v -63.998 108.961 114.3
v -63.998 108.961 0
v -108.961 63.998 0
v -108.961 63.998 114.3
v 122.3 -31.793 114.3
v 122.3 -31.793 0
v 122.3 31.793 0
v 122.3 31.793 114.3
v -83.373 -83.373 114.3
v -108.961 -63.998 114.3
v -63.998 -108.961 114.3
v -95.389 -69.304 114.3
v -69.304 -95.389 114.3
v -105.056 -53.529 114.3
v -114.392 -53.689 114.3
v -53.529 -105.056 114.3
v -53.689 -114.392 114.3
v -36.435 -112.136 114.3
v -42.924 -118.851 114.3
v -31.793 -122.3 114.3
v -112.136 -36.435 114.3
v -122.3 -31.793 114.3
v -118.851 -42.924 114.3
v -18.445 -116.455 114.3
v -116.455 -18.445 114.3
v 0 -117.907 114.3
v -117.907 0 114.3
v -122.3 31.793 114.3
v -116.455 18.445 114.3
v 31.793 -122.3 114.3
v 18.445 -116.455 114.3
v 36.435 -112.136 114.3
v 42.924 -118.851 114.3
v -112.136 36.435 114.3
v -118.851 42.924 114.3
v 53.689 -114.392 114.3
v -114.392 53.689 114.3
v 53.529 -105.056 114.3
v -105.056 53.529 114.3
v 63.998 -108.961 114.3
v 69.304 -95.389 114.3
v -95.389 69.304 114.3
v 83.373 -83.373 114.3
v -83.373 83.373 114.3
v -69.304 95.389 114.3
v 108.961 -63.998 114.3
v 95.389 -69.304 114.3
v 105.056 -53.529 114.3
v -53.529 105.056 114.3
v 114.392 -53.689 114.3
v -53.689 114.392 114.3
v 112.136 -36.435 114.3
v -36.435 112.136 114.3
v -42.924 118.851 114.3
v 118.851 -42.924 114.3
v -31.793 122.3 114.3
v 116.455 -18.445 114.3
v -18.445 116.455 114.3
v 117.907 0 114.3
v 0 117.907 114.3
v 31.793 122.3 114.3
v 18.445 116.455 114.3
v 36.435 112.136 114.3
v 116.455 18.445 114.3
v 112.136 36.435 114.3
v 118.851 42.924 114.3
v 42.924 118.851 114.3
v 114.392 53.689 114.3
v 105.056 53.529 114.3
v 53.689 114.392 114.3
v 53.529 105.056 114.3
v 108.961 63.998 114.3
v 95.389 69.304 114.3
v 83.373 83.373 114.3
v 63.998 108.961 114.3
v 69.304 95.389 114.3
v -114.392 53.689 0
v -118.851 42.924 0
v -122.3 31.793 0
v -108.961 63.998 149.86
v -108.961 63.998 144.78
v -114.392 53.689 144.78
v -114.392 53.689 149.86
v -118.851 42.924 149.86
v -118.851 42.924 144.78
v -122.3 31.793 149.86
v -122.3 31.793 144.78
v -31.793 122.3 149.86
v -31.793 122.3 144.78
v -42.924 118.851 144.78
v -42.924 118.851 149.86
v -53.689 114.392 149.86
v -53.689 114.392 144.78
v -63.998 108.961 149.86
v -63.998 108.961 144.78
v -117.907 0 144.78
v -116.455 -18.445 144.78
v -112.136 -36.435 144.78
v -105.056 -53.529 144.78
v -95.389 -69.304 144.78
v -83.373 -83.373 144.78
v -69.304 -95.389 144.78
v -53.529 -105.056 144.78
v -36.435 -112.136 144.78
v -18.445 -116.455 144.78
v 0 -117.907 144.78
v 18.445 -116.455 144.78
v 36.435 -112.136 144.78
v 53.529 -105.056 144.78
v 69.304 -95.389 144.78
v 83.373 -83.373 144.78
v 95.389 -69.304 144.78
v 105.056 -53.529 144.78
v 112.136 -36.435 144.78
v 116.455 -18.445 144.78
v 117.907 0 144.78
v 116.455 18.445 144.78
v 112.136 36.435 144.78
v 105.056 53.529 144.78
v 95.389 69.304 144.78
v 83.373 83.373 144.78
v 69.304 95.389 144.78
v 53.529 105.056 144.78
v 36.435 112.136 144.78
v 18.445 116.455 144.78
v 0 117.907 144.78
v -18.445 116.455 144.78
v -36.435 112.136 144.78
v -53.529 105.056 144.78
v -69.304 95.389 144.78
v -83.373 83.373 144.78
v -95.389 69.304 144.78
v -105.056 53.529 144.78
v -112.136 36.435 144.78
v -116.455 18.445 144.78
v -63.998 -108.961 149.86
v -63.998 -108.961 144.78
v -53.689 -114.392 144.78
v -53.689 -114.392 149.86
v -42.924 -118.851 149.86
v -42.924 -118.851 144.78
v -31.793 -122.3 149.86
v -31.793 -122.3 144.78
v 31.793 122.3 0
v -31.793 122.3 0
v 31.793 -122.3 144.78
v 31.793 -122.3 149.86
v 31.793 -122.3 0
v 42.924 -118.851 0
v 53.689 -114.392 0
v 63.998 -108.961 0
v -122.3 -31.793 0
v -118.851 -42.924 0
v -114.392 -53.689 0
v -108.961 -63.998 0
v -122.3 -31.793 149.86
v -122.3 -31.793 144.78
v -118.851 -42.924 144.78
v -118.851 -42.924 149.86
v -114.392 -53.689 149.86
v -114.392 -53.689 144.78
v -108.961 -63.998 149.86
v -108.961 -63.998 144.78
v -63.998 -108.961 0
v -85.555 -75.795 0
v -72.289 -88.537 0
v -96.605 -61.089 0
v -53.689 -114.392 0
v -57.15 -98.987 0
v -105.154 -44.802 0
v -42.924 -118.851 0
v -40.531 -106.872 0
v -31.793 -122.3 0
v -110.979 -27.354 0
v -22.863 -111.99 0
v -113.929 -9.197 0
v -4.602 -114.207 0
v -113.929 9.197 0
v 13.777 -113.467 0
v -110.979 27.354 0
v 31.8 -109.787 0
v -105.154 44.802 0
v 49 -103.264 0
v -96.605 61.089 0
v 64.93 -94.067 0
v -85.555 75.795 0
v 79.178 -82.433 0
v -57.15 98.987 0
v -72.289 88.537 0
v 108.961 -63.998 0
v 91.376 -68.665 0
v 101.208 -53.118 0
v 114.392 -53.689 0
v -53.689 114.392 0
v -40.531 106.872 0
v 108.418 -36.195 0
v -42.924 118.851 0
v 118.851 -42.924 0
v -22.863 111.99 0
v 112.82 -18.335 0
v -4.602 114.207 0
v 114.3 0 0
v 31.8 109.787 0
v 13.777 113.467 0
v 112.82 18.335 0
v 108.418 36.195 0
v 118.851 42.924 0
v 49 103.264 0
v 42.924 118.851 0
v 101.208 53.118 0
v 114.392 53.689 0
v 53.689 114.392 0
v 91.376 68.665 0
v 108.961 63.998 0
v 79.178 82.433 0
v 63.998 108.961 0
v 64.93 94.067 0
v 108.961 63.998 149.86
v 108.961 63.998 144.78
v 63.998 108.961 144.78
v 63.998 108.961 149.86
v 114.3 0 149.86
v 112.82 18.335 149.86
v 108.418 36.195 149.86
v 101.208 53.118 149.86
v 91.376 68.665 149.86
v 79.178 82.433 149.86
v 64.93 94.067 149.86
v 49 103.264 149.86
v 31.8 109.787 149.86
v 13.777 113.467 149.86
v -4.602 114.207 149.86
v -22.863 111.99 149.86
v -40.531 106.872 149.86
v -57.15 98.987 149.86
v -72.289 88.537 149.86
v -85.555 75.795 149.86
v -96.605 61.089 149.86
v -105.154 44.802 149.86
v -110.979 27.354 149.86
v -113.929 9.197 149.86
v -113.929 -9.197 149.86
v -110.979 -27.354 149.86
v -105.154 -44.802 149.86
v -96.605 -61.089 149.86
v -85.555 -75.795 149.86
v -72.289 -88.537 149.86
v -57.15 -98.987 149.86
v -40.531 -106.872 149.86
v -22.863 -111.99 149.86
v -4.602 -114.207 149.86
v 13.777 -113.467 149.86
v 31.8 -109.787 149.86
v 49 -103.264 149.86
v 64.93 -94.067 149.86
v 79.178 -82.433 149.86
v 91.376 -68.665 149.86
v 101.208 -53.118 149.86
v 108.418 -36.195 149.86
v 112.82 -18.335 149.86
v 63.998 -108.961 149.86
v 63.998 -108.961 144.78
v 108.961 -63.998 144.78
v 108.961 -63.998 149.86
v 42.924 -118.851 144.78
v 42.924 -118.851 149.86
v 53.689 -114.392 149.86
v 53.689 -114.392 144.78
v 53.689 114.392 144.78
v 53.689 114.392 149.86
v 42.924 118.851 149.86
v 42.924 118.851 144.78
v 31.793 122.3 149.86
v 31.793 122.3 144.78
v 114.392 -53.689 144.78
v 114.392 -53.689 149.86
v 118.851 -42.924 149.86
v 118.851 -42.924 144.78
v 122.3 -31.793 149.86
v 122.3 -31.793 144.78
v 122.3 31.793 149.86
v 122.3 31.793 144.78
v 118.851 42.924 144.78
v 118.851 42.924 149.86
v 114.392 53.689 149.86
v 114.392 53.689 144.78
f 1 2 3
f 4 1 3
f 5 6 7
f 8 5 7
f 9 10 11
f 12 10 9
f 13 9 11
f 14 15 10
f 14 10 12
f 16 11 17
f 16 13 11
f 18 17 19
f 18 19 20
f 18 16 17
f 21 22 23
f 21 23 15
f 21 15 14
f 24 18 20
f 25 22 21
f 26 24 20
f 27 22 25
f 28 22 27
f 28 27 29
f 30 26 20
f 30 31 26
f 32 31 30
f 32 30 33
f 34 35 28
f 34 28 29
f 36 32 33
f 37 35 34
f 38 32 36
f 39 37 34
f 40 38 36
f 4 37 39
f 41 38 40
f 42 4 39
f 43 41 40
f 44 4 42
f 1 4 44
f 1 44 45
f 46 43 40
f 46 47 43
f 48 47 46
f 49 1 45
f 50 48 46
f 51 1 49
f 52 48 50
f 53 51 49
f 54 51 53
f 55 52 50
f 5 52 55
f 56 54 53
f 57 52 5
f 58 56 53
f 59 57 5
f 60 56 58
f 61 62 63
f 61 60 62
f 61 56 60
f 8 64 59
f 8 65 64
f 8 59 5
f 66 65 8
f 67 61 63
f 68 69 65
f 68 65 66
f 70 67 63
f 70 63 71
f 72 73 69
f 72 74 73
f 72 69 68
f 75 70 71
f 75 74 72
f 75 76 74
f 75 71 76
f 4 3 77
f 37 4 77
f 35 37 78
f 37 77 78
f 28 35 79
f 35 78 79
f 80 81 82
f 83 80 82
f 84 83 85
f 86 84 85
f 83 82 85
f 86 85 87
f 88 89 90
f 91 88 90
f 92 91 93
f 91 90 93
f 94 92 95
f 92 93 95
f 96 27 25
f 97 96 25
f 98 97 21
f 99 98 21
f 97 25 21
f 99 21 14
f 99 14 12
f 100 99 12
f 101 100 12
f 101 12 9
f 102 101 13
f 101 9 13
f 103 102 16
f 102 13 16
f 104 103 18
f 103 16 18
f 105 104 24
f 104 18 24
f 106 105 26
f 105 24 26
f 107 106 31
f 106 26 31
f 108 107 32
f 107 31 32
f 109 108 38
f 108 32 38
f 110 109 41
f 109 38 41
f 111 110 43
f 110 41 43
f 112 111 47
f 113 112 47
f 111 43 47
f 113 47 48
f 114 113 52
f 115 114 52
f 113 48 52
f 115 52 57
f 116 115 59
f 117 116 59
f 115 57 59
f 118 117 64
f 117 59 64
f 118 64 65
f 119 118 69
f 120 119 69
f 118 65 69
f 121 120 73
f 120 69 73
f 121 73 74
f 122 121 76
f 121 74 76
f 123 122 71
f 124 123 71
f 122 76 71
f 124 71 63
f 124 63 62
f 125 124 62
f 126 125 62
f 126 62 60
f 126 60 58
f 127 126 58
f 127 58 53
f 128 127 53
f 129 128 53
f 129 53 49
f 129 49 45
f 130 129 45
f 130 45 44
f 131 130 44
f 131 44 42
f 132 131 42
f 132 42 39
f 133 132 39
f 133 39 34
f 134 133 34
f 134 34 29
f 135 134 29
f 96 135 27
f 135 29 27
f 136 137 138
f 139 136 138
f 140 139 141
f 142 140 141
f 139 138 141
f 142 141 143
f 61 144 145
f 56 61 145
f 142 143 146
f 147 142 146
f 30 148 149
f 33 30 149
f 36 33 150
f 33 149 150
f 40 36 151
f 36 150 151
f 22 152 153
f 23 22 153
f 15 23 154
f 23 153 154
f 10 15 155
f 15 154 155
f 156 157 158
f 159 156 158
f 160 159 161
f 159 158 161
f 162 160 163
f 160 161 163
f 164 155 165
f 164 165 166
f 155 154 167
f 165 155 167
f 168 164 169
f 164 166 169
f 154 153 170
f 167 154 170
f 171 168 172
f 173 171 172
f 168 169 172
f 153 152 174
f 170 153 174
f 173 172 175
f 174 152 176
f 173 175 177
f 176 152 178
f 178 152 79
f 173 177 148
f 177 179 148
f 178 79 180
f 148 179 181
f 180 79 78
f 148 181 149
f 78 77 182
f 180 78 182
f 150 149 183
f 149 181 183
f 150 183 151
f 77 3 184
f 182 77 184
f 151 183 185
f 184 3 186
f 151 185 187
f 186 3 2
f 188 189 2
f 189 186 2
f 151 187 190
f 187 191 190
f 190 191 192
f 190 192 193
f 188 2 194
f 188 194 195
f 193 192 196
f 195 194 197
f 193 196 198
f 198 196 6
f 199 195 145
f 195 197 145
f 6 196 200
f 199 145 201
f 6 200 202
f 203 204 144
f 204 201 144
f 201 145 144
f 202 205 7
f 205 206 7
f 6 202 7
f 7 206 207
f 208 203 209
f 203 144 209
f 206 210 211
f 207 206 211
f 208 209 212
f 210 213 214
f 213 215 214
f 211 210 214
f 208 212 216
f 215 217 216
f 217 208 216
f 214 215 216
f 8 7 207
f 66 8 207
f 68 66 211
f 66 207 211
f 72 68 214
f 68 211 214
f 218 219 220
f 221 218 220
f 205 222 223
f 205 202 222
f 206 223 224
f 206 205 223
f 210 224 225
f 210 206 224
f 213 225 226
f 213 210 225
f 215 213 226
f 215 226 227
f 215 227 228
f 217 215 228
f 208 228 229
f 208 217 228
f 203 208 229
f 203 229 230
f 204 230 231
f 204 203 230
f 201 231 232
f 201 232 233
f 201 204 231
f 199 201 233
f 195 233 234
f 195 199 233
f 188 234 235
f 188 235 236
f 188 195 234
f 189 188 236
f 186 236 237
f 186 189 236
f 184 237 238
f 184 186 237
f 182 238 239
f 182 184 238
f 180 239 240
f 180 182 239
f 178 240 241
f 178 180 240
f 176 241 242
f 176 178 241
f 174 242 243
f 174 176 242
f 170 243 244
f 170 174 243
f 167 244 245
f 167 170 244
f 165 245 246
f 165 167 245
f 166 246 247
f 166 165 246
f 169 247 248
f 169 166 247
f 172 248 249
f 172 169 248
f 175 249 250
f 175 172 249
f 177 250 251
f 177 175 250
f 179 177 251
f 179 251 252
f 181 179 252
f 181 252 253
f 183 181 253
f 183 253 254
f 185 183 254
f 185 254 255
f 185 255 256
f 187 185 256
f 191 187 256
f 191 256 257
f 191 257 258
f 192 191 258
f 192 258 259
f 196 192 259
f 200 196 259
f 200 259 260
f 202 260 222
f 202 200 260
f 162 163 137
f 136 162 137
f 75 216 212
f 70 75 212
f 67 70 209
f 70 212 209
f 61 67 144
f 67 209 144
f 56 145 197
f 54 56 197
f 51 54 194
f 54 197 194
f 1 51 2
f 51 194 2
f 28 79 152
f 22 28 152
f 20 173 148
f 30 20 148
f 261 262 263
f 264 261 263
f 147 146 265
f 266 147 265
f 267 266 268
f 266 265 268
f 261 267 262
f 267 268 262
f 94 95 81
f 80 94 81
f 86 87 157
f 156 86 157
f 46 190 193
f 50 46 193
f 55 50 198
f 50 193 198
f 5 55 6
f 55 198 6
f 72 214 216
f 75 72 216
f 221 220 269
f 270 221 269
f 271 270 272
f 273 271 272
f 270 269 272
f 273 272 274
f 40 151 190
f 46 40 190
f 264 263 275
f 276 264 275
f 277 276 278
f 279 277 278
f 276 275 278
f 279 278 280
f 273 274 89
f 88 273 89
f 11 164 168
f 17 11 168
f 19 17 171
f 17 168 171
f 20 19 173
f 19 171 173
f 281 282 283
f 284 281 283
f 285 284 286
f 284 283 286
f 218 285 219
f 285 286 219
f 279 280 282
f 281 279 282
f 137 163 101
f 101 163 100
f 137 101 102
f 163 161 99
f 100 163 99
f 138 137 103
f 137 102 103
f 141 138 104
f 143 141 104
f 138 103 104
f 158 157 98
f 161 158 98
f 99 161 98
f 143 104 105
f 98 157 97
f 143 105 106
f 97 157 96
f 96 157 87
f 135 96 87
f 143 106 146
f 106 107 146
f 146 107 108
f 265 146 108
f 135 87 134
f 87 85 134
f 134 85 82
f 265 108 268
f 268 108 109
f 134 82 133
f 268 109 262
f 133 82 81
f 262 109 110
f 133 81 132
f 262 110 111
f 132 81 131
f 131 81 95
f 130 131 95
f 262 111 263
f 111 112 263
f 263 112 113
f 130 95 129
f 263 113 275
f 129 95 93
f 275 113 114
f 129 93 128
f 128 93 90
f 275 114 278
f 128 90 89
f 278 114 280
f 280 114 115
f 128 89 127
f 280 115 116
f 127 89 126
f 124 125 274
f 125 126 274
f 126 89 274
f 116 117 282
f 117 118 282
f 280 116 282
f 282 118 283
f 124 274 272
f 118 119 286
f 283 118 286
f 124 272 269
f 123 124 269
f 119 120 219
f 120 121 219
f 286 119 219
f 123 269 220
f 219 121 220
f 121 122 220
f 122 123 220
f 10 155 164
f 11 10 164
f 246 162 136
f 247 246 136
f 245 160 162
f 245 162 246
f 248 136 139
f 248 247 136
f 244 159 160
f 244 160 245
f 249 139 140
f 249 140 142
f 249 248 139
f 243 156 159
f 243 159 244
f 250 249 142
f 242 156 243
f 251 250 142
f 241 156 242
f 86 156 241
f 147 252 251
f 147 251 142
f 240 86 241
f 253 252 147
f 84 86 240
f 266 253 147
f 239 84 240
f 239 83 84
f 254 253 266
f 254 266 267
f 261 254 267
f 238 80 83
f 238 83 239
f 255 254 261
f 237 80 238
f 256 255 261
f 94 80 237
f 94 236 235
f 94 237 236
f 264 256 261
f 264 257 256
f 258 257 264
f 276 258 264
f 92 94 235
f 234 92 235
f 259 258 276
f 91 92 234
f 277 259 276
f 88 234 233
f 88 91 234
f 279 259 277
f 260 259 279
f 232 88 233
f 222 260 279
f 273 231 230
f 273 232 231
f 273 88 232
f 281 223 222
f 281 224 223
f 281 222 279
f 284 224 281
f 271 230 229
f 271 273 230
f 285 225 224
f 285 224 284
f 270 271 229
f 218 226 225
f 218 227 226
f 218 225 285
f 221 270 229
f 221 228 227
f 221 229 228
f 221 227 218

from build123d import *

# Parameters (mm, degrees)
SKETCH1_R           = 114.3
BOSS_EXTRUDE1_DEPTH = 114.3
SKETCH2_R           = 117.9068
SKETCH2_R_2         = 114.3
BOSS_EXTRUDE2_DEPTH = 30.48
SKETCH3_R           = 114.3
BOSS_EXTRUDE3_DEPTH = 5.08


with BuildPart() as part:
    # Sketch1 → Boss-Extrude1 (new body)
    with BuildSketch(Plane.XY):
        with BuildLine():
            ThreePointArc((-31.793446259, 122.3), (-48.357791931, 116.746037126), (-63.997797892, 108.960520786))
            Line((-63.997797892, 108.960520786), (-108.960520786, 63.997797892))
            ThreePointArc((-108.960520786, 63.997797892), (-116.746037126, 48.357791931), (-122.3, 31.793446259))
            Line((-122.3, 31.793446259), (-122.3, -31.793446259))
            ThreePointArc((-122.3, -31.793446259), (-116.746037126, -48.357791931), (-108.960520786, -63.997797892))
            Line((-108.960520786, -63.997797892), (-63.997797892, -108.960520786))
            ThreePointArc((-63.997797892, -108.960520786), (-48.357791931, -116.746037126), (-31.793446259, -122.3))
            Line((-31.793446259, -122.3), (31.793446259, -122.3))
            ThreePointArc((31.793446259, -122.3), (48.357791931, -116.746037126), (63.997797892, -108.960520786))
            Line((63.997797892, -108.960520786), (108.960520786, -63.997797892))
            ThreePointArc((108.960520786, -63.997797892), (116.746037126, -48.357791931), (122.3, -31.793446259))
            Line((122.3, -31.793446259), (122.3, 31.793446259))
            ThreePointArc((122.3, 31.793446259), (116.746037126, 48.357791931), (108.960520786, 63.997797892))
            Line((108.960520786, 63.997797892), (63.997797892, 108.960520786))
            ThreePointArc((63.997797892, 108.960520786), (48.357791931, 116.746037126), (31.793446259, 122.3))
            Line((31.793446259, 122.3), (-31.793446259, 122.3))
        make_face()
        Circle(SKETCH1_R, mode=Mode.SUBTRACT)
    extrude(amount=BOSS_EXTRUDE1_DEPTH)

    # Sketch2 → Boss-Extrude2 (add)
    with BuildSketch(Plane.XY.offset(114.3)):
        with Locations(Location((0, 0, 0), (0, 0, 180))):
            Circle(SKETCH2_R)
        Circle(SKETCH2_R_2, mode=Mode.SUBTRACT)
    extrude(amount=BOSS_EXTRUDE2_DEPTH)

    # Sketch3 → Boss-Extrude3 (add)
    with BuildSketch(Plane.XY.offset(144.78)):
        with BuildLine():
            Line((122.3, -31.793446259), (122.3, 31.793446259))
            ThreePointArc((122.3, 31.793446259), (116.746037126, 48.357791931), (108.960520786, 63.997797892))
            Line((108.960520786, 63.997797892), (63.997797892, 108.960520786))
            ThreePointArc((63.997797892, 108.960520786), (48.357791931, 116.746037126), (31.793446259, 122.3))
            Line((31.793446259, 122.3), (-31.793446259, 122.3))
            ThreePointArc((-31.793446259, 122.3), (-48.357791931, 116.746037126), (-63.997797892, 108.960520786))
            Line((-63.997797892, 108.960520786), (-108.960520786, 63.997797892))
            ThreePointArc((-108.960520786, 63.997797892), (-116.746037126, 48.357791931), (-122.3, 31.793446259))
            Line((-122.3, 31.793446259), (-122.3, -31.793446259))
            ThreePointArc((-122.3, -31.793446259), (-116.746037126, -48.357791931), (-108.960520786, -63.997797892))
            Line((-108.960520786, -63.997797892), (-63.997797892, -108.960520786))
            ThreePointArc((-63.997797892, -108.960520786), (-48.357791931, -116.746037126), (-31.793446259, -122.3))
            Line((-31.793446259, -122.3), (31.793446259, -122.3))
            ThreePointArc((31.793446259, -122.3), (48.357791931, -116.746037126), (63.997797892, -108.960520786))
            Line((63.997797892, -108.960520786), (108.960520786, -63.997797892))
            ThreePointArc((108.960520786, -63.997797892), (116.746037126, -48.357791931), (122.3, -31.793446259))
        make_face()
        Circle(SKETCH3_R, mode=Mode.SUBTRACT)
    extrude(amount=BOSS_EXTRUDE3_DEPTH)


solid = part.part
